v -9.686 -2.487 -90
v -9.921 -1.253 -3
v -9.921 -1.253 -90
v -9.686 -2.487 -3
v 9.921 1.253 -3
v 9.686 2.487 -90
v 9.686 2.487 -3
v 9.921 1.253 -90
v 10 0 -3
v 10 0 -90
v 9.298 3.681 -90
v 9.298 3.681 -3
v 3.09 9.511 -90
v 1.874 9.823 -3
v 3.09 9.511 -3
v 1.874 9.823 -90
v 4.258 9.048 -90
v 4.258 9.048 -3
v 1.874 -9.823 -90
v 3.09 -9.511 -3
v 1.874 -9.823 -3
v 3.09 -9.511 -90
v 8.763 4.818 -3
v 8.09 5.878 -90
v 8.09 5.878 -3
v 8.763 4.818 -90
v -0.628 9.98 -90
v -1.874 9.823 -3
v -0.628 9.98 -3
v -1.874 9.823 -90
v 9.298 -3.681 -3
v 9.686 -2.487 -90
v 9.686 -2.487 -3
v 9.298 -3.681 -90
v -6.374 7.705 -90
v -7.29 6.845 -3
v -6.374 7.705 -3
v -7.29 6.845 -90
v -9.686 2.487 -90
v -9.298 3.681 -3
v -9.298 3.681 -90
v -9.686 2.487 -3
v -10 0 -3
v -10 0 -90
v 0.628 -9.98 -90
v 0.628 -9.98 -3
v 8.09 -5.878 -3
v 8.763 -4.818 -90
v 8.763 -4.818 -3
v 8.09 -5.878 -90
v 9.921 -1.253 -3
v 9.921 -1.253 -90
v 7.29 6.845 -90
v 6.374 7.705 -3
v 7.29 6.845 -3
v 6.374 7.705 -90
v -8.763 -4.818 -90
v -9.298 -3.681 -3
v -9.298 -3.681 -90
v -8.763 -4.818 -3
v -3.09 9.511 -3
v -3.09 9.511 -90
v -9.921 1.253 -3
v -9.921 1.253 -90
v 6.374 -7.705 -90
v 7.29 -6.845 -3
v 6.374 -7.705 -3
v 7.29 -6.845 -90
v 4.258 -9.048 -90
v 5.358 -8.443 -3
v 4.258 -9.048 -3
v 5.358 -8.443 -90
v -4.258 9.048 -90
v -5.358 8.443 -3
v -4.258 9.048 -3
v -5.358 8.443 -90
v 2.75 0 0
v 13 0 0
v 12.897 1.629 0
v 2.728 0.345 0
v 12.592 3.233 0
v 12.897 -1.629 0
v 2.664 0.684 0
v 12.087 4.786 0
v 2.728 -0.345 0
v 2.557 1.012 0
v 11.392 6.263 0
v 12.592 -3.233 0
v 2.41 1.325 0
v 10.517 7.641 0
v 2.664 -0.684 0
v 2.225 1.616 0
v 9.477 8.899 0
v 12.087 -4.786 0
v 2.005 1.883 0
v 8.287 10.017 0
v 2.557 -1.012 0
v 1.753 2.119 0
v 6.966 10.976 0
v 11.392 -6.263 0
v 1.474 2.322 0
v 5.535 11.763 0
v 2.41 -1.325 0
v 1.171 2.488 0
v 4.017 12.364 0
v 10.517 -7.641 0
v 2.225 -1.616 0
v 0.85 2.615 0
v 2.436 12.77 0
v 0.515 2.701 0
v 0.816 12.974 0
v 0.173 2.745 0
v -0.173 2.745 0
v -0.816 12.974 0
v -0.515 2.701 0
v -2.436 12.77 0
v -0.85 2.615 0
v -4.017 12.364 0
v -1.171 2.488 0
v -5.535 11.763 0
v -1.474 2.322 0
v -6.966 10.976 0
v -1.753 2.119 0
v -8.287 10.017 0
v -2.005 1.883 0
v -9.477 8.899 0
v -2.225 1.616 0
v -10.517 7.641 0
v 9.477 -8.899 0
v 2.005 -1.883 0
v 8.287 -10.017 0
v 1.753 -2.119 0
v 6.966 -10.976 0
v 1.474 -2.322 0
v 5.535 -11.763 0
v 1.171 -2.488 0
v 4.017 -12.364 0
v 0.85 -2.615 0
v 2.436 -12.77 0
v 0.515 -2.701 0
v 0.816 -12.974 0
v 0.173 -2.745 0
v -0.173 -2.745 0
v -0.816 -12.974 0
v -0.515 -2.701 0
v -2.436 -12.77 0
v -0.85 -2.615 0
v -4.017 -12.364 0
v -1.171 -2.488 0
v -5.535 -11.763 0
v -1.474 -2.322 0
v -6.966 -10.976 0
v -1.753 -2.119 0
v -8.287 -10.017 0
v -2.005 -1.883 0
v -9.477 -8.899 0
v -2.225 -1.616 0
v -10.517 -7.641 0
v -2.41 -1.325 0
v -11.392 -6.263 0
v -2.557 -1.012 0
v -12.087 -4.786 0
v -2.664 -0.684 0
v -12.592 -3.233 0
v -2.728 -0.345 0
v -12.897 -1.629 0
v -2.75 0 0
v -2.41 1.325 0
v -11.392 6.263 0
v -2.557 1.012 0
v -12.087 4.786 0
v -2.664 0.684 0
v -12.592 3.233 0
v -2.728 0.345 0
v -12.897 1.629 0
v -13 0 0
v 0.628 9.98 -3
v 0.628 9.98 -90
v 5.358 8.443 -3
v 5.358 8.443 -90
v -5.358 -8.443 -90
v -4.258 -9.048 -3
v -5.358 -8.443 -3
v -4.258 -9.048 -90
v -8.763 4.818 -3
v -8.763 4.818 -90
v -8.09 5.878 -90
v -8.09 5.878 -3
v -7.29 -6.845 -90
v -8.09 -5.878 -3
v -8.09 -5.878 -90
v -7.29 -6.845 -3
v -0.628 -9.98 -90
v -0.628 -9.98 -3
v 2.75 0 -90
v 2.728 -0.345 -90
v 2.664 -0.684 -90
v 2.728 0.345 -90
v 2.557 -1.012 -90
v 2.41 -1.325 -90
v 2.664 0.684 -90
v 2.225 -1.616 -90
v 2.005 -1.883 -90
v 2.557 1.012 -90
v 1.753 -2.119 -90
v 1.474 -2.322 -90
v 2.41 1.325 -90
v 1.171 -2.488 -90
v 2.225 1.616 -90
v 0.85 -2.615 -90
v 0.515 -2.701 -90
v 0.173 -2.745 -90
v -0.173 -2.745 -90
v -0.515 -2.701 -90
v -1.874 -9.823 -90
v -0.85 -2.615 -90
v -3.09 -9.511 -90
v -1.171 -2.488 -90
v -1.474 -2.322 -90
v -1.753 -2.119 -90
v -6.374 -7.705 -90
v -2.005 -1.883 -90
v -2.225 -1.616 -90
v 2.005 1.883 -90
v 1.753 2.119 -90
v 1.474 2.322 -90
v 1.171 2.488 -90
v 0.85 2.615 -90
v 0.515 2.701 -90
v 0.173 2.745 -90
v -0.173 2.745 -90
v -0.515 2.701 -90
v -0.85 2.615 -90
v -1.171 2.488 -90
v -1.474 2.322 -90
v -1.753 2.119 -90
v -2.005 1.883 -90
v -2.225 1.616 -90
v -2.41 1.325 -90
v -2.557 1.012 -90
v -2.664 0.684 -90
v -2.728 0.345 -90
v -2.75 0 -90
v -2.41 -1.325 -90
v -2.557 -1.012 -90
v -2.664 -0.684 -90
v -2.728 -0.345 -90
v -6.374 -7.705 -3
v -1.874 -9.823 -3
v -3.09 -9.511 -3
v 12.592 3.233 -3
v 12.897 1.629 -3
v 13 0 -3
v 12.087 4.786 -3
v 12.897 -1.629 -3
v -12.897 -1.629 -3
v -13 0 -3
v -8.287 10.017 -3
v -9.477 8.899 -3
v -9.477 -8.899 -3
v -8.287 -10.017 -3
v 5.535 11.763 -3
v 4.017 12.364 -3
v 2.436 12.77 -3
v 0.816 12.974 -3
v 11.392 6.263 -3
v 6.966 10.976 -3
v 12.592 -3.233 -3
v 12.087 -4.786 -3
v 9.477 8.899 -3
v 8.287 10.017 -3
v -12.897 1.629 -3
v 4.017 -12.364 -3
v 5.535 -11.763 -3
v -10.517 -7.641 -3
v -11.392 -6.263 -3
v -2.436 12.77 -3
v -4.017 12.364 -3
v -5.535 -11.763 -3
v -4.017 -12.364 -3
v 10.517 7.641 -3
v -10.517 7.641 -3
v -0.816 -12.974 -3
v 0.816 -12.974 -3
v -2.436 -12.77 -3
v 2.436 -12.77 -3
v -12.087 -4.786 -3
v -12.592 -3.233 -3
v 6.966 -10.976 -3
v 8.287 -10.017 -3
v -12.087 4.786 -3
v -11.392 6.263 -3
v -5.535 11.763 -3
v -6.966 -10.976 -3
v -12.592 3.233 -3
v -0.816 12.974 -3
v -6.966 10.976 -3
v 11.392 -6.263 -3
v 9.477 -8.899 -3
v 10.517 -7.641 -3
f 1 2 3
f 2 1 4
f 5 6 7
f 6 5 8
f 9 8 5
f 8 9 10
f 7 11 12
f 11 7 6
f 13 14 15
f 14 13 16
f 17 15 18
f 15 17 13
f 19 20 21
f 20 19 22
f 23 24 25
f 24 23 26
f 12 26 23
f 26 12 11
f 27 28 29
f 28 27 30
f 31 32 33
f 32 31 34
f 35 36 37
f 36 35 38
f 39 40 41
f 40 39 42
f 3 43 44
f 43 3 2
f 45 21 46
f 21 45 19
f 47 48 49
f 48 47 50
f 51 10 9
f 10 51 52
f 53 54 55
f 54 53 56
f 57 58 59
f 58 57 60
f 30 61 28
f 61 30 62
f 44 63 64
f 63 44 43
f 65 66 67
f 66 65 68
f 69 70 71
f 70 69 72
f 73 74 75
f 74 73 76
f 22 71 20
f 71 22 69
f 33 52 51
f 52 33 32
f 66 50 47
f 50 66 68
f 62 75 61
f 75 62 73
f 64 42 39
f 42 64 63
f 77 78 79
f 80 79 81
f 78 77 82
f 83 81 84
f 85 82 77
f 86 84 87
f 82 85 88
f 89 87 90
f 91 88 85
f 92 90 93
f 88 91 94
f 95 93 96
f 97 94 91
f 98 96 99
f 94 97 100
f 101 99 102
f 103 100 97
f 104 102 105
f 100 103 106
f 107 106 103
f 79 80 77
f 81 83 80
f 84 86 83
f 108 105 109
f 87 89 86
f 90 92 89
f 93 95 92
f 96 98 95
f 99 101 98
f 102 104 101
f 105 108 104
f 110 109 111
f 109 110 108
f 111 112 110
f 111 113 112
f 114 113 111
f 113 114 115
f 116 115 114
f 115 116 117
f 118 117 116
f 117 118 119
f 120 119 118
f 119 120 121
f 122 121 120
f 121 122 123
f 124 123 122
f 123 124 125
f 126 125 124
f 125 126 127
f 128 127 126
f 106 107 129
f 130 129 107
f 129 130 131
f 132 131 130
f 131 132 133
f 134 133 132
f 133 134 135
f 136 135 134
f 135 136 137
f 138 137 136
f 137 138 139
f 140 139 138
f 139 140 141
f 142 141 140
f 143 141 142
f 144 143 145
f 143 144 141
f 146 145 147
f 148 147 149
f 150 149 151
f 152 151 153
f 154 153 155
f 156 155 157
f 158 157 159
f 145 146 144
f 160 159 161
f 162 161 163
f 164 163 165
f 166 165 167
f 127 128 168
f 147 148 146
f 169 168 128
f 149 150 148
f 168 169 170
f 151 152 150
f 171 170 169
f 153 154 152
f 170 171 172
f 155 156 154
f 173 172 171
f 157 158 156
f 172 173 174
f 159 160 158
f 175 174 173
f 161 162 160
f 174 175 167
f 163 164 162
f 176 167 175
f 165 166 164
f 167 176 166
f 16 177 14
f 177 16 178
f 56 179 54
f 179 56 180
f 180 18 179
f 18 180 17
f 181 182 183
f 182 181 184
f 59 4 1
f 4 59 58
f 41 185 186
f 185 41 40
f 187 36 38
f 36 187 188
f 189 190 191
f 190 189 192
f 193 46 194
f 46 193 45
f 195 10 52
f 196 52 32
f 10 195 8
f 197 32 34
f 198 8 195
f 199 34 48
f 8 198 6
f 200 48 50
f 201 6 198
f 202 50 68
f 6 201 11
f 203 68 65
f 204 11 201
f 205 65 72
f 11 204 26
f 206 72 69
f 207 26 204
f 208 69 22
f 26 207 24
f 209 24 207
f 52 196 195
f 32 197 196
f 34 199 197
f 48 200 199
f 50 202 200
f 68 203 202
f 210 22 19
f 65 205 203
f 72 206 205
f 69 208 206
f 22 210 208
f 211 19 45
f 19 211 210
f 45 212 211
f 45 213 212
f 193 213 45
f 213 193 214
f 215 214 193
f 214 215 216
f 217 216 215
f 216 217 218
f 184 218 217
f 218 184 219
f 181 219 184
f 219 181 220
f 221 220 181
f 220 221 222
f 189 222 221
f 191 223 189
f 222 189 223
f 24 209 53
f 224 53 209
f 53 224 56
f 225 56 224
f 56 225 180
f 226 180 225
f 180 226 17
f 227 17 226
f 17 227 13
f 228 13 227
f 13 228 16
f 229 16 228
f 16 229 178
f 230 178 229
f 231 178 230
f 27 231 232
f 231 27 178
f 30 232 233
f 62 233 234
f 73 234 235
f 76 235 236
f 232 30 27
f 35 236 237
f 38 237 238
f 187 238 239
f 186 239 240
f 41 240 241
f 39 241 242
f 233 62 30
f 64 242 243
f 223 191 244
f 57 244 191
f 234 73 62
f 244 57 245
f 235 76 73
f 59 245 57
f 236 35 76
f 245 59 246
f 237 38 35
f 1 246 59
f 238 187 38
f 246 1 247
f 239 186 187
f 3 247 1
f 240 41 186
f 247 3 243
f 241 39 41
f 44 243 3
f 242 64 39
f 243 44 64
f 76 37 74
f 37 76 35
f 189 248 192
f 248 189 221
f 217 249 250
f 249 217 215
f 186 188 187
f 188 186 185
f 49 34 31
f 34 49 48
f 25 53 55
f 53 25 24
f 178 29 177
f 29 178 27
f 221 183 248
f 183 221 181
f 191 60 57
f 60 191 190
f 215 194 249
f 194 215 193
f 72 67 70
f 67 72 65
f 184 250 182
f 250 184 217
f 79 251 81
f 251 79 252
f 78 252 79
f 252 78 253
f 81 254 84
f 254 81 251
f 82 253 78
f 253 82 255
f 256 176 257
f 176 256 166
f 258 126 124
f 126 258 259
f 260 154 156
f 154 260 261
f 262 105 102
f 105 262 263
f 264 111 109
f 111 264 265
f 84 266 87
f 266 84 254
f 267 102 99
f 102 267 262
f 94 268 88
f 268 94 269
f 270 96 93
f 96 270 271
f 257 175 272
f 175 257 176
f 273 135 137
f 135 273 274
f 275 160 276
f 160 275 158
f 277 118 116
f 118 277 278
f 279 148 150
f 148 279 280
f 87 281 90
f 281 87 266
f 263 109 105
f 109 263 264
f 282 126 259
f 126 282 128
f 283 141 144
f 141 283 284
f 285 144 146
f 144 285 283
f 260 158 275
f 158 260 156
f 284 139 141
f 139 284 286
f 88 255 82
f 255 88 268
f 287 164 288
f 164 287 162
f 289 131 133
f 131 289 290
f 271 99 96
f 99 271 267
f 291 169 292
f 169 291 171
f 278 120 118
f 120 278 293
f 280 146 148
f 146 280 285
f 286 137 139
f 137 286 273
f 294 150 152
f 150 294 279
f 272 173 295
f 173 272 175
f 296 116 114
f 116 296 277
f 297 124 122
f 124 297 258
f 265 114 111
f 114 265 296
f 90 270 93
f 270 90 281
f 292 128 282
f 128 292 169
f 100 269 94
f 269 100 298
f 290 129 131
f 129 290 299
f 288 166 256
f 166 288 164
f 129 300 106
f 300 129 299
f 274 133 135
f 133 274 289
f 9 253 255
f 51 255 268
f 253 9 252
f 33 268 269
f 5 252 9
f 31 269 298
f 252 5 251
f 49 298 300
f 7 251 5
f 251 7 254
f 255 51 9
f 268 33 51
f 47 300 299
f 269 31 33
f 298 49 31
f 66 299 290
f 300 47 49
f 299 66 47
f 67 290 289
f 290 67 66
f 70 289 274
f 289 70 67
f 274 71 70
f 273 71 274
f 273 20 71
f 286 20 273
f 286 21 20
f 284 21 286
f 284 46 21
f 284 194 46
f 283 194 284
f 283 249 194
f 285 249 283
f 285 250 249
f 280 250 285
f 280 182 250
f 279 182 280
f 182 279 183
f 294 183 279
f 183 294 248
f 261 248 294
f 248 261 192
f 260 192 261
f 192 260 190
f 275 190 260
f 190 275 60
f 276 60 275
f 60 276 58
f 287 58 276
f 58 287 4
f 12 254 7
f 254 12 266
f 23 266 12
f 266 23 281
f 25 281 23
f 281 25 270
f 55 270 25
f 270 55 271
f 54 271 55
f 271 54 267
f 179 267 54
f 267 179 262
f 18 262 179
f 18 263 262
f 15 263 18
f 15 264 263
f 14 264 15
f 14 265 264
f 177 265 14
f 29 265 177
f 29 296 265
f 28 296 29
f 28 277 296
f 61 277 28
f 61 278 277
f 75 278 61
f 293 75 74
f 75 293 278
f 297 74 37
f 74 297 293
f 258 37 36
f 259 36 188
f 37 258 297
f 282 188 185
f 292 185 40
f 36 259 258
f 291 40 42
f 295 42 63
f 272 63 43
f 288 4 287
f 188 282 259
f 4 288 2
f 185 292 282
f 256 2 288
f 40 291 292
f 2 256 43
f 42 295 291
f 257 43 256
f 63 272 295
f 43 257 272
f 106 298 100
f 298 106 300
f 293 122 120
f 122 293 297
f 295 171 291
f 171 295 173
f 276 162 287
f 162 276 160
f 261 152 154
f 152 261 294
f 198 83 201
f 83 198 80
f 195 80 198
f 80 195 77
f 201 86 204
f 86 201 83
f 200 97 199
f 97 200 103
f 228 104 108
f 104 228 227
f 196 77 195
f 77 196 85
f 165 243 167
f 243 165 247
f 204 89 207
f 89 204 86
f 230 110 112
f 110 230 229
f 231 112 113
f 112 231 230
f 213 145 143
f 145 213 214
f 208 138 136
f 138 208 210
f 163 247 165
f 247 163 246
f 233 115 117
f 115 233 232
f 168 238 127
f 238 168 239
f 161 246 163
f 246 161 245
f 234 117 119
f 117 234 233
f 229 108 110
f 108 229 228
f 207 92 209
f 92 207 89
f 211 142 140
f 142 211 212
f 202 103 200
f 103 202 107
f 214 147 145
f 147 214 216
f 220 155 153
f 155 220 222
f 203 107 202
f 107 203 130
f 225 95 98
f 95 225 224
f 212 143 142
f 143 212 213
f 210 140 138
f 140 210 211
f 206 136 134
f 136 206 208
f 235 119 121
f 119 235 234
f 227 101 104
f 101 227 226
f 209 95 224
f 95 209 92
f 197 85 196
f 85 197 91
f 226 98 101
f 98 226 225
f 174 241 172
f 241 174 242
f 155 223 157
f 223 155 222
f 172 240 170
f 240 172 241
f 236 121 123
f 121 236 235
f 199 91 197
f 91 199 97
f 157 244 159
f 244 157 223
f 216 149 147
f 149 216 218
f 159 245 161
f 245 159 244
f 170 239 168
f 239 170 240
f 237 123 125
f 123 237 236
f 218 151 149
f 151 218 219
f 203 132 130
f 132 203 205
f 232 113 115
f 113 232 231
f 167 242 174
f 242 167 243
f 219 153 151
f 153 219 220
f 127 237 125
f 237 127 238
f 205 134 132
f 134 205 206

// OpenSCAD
$fn = 50;


difference() {
	union() {
		translate(v = [0, 0, -90.0000000000]) {
			cylinder(h = 90, r = 10.0000000000);
		}
		translate(v = [0, 0, -3.0000000000]) {
			cylinder(h = 3, r = 13.0000000000);
		}
	}
	union() {
		#translate(v = [0, 0, -90]) {
			cylinder(h = 90, r = 2.7500000000);
		}
	}
}
